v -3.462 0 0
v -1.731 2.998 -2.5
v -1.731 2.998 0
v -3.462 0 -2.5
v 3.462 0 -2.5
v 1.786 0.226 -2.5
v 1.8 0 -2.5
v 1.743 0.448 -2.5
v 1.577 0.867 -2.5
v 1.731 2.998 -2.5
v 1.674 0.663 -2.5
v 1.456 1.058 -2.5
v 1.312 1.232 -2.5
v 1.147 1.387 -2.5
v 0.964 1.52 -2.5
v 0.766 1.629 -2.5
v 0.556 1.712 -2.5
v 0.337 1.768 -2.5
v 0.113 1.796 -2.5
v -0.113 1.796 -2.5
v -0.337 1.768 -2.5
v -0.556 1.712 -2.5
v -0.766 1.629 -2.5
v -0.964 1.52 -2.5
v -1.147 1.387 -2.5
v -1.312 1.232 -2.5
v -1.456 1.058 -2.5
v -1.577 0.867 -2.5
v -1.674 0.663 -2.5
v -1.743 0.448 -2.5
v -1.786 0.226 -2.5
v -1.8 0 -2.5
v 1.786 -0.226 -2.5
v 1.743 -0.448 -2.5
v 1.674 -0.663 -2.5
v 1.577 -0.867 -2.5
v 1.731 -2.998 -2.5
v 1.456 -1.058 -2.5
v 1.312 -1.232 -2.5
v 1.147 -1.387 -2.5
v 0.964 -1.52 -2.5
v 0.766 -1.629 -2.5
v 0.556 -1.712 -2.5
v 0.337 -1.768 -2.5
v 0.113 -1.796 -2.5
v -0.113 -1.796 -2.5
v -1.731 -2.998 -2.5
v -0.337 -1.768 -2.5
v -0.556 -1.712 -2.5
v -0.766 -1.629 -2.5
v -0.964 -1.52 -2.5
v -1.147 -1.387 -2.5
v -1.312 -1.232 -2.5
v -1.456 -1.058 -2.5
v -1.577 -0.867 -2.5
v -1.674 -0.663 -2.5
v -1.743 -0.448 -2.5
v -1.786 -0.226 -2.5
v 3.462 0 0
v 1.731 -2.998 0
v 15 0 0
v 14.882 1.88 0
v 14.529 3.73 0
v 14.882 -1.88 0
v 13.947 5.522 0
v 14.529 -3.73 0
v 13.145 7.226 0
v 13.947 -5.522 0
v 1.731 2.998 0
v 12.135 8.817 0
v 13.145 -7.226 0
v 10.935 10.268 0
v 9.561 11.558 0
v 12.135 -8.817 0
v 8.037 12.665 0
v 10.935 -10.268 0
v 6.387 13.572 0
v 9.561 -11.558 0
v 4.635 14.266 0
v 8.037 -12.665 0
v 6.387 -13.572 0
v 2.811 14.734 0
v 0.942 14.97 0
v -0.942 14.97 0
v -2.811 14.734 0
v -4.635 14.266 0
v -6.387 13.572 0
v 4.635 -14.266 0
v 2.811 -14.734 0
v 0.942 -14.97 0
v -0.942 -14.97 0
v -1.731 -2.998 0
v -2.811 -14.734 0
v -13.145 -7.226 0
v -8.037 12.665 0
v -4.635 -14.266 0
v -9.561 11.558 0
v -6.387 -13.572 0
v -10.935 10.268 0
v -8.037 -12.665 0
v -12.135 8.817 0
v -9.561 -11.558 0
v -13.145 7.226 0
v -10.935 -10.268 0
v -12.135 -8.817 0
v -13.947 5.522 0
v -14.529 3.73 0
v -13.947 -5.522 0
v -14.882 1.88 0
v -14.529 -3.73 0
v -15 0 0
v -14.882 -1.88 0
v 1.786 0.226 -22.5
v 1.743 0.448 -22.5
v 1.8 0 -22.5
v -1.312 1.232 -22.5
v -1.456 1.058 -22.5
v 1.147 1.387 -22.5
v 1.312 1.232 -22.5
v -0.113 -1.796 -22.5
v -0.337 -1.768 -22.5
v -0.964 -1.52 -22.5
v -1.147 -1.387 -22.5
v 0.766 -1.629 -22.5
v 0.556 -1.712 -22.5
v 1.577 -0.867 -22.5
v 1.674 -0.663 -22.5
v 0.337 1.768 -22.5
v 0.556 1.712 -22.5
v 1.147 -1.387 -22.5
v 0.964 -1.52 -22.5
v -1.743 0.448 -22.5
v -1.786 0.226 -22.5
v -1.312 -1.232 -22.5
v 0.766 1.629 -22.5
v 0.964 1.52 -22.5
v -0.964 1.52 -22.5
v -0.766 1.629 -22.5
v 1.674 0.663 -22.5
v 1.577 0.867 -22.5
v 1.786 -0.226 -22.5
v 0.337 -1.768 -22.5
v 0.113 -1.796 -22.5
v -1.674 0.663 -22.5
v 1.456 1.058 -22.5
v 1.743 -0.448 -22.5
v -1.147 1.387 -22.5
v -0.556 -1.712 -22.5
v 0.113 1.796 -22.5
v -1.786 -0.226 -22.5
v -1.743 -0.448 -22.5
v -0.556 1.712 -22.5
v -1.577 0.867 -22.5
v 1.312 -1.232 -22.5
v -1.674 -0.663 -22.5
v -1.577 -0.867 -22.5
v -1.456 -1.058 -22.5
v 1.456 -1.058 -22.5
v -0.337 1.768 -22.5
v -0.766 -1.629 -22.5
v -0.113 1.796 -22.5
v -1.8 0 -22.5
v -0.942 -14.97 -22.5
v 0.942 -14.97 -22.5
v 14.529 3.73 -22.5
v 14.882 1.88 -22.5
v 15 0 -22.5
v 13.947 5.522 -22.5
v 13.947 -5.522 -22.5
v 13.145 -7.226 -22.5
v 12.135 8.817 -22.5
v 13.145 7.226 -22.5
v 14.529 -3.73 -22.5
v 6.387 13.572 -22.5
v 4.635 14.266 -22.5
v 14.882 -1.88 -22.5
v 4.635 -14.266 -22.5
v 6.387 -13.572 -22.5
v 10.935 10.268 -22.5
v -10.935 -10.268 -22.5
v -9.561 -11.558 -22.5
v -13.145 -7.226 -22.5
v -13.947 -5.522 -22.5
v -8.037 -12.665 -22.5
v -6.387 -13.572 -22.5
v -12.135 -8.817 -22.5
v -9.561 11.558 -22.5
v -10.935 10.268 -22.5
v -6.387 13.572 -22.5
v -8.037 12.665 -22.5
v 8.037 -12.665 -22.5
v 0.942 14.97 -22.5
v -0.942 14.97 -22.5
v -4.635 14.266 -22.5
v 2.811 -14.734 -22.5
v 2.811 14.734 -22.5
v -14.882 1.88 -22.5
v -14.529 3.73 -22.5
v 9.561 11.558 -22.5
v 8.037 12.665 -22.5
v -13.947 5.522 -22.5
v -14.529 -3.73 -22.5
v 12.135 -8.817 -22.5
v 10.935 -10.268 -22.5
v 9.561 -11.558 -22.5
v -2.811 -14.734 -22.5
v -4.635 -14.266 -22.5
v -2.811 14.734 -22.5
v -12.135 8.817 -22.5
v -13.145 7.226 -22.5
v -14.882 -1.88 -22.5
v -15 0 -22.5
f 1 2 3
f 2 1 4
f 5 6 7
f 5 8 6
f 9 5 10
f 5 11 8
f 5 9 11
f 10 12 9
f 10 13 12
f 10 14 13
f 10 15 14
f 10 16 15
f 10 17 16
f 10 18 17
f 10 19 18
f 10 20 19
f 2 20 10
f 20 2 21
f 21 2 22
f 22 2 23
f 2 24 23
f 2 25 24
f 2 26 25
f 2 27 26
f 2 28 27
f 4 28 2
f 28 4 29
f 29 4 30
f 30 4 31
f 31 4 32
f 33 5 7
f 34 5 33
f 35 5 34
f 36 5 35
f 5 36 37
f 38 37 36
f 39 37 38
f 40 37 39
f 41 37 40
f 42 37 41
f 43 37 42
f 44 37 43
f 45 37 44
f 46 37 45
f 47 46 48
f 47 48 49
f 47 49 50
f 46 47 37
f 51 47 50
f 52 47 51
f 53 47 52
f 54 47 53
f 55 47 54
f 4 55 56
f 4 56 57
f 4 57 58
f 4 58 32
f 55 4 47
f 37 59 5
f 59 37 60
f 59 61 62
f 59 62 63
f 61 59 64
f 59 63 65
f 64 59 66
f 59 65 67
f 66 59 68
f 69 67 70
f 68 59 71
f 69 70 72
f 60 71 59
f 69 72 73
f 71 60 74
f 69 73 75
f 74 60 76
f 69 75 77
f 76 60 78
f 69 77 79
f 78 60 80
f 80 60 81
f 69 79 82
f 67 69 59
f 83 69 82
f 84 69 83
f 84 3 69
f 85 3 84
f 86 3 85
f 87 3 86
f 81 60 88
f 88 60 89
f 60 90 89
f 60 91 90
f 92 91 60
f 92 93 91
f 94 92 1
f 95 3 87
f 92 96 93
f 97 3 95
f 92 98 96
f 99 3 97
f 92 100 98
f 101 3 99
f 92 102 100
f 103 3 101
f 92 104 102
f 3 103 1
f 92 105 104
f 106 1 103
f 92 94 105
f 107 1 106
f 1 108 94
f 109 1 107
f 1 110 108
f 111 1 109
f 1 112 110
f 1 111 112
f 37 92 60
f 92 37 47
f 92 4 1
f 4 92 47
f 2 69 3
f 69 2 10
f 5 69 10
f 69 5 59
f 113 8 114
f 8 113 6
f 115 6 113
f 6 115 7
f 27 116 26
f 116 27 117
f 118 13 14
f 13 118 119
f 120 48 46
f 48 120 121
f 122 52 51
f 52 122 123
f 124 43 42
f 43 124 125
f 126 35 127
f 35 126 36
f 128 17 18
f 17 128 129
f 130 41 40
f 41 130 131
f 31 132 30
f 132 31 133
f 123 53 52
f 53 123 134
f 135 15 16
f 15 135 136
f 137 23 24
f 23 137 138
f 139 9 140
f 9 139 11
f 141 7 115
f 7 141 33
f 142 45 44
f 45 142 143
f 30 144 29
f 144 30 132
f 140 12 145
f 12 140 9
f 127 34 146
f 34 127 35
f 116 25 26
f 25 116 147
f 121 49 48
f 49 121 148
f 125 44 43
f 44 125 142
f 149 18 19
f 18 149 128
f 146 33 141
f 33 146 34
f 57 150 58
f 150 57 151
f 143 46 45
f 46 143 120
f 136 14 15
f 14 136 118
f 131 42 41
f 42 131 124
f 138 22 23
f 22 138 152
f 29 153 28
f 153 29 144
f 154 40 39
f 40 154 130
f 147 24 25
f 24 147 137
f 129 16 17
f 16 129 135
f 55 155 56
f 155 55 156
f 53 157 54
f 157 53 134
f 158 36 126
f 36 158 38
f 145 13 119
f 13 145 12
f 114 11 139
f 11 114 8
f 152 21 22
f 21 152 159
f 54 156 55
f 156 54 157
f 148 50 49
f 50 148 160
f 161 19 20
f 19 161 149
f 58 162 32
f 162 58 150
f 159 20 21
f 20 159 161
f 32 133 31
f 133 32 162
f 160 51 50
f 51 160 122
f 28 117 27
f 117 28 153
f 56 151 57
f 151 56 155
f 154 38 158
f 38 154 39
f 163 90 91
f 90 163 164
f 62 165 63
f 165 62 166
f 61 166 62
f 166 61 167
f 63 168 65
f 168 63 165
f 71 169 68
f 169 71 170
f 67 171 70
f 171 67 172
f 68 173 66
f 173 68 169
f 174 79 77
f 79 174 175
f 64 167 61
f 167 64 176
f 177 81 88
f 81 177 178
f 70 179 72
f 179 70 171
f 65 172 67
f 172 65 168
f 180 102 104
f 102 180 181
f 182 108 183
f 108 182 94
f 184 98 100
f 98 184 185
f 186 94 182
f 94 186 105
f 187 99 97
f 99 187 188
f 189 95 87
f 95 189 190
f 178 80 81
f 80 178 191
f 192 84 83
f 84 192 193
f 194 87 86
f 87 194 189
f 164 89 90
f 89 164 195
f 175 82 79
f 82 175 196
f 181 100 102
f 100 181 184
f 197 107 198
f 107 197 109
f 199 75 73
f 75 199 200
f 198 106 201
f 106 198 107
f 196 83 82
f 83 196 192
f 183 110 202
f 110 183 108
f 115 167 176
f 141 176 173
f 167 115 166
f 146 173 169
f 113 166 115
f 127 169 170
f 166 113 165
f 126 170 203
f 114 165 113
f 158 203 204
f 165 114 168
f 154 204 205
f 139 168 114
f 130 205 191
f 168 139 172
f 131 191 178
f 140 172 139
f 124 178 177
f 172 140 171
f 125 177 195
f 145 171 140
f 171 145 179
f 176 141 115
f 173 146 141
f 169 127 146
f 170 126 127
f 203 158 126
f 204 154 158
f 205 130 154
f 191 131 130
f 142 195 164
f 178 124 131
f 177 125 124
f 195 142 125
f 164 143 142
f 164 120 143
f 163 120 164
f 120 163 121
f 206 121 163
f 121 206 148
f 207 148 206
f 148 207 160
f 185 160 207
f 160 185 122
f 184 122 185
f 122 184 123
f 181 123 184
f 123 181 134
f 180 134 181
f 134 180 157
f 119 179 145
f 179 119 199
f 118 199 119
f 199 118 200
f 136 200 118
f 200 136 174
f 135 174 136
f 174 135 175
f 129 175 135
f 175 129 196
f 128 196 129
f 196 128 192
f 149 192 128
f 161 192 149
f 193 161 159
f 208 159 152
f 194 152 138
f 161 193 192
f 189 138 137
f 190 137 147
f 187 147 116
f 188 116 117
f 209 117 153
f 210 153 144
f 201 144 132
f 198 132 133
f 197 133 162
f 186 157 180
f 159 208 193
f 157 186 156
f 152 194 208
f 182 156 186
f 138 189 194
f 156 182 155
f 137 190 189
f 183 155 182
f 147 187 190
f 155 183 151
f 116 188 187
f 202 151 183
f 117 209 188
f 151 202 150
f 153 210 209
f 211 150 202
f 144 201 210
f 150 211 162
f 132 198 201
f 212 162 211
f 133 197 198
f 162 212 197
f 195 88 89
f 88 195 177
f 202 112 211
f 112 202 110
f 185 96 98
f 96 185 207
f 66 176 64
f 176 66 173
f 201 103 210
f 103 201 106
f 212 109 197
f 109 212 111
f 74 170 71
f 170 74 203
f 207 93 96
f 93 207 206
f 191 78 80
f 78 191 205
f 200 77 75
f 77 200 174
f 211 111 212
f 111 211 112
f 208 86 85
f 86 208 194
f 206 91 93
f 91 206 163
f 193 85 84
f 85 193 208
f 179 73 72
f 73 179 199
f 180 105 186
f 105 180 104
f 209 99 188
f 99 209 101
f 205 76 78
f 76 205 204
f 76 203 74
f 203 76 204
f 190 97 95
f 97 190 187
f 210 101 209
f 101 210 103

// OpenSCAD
$fn = 50;

difference() {
	union() {
		translate(v = [0, 0, -22.5]) {
			cylinder(h = 22.5, r = 15.0);
		}
	}
	union() {
		translate(v = [0, 0, 0]) {
			rotate(a = [0, 0, 0]) {
				difference() {
					union() {
						translate(v = [0, 0, -2.5]) {
							linear_extrude(height = 2.5) {
								polygon(points = [[3.4619999999999997, 0.0], [1.7310000000000003, 2.9981799479017264], [-1.7309999999999992, 2.9981799479017264], [-3.4619999999999997, 4.2397272186481365e-16], [-1.7310000000000014, -2.998179947901726], [1.7309999999999977, -2.9981799479017277]]);
							}
						}
					}
					union();
				}
			}
		}
		#translate(v = [0, 0, -100.0]) {
			cylinder(h = 200, r = 1.8);
		}
	}
}
